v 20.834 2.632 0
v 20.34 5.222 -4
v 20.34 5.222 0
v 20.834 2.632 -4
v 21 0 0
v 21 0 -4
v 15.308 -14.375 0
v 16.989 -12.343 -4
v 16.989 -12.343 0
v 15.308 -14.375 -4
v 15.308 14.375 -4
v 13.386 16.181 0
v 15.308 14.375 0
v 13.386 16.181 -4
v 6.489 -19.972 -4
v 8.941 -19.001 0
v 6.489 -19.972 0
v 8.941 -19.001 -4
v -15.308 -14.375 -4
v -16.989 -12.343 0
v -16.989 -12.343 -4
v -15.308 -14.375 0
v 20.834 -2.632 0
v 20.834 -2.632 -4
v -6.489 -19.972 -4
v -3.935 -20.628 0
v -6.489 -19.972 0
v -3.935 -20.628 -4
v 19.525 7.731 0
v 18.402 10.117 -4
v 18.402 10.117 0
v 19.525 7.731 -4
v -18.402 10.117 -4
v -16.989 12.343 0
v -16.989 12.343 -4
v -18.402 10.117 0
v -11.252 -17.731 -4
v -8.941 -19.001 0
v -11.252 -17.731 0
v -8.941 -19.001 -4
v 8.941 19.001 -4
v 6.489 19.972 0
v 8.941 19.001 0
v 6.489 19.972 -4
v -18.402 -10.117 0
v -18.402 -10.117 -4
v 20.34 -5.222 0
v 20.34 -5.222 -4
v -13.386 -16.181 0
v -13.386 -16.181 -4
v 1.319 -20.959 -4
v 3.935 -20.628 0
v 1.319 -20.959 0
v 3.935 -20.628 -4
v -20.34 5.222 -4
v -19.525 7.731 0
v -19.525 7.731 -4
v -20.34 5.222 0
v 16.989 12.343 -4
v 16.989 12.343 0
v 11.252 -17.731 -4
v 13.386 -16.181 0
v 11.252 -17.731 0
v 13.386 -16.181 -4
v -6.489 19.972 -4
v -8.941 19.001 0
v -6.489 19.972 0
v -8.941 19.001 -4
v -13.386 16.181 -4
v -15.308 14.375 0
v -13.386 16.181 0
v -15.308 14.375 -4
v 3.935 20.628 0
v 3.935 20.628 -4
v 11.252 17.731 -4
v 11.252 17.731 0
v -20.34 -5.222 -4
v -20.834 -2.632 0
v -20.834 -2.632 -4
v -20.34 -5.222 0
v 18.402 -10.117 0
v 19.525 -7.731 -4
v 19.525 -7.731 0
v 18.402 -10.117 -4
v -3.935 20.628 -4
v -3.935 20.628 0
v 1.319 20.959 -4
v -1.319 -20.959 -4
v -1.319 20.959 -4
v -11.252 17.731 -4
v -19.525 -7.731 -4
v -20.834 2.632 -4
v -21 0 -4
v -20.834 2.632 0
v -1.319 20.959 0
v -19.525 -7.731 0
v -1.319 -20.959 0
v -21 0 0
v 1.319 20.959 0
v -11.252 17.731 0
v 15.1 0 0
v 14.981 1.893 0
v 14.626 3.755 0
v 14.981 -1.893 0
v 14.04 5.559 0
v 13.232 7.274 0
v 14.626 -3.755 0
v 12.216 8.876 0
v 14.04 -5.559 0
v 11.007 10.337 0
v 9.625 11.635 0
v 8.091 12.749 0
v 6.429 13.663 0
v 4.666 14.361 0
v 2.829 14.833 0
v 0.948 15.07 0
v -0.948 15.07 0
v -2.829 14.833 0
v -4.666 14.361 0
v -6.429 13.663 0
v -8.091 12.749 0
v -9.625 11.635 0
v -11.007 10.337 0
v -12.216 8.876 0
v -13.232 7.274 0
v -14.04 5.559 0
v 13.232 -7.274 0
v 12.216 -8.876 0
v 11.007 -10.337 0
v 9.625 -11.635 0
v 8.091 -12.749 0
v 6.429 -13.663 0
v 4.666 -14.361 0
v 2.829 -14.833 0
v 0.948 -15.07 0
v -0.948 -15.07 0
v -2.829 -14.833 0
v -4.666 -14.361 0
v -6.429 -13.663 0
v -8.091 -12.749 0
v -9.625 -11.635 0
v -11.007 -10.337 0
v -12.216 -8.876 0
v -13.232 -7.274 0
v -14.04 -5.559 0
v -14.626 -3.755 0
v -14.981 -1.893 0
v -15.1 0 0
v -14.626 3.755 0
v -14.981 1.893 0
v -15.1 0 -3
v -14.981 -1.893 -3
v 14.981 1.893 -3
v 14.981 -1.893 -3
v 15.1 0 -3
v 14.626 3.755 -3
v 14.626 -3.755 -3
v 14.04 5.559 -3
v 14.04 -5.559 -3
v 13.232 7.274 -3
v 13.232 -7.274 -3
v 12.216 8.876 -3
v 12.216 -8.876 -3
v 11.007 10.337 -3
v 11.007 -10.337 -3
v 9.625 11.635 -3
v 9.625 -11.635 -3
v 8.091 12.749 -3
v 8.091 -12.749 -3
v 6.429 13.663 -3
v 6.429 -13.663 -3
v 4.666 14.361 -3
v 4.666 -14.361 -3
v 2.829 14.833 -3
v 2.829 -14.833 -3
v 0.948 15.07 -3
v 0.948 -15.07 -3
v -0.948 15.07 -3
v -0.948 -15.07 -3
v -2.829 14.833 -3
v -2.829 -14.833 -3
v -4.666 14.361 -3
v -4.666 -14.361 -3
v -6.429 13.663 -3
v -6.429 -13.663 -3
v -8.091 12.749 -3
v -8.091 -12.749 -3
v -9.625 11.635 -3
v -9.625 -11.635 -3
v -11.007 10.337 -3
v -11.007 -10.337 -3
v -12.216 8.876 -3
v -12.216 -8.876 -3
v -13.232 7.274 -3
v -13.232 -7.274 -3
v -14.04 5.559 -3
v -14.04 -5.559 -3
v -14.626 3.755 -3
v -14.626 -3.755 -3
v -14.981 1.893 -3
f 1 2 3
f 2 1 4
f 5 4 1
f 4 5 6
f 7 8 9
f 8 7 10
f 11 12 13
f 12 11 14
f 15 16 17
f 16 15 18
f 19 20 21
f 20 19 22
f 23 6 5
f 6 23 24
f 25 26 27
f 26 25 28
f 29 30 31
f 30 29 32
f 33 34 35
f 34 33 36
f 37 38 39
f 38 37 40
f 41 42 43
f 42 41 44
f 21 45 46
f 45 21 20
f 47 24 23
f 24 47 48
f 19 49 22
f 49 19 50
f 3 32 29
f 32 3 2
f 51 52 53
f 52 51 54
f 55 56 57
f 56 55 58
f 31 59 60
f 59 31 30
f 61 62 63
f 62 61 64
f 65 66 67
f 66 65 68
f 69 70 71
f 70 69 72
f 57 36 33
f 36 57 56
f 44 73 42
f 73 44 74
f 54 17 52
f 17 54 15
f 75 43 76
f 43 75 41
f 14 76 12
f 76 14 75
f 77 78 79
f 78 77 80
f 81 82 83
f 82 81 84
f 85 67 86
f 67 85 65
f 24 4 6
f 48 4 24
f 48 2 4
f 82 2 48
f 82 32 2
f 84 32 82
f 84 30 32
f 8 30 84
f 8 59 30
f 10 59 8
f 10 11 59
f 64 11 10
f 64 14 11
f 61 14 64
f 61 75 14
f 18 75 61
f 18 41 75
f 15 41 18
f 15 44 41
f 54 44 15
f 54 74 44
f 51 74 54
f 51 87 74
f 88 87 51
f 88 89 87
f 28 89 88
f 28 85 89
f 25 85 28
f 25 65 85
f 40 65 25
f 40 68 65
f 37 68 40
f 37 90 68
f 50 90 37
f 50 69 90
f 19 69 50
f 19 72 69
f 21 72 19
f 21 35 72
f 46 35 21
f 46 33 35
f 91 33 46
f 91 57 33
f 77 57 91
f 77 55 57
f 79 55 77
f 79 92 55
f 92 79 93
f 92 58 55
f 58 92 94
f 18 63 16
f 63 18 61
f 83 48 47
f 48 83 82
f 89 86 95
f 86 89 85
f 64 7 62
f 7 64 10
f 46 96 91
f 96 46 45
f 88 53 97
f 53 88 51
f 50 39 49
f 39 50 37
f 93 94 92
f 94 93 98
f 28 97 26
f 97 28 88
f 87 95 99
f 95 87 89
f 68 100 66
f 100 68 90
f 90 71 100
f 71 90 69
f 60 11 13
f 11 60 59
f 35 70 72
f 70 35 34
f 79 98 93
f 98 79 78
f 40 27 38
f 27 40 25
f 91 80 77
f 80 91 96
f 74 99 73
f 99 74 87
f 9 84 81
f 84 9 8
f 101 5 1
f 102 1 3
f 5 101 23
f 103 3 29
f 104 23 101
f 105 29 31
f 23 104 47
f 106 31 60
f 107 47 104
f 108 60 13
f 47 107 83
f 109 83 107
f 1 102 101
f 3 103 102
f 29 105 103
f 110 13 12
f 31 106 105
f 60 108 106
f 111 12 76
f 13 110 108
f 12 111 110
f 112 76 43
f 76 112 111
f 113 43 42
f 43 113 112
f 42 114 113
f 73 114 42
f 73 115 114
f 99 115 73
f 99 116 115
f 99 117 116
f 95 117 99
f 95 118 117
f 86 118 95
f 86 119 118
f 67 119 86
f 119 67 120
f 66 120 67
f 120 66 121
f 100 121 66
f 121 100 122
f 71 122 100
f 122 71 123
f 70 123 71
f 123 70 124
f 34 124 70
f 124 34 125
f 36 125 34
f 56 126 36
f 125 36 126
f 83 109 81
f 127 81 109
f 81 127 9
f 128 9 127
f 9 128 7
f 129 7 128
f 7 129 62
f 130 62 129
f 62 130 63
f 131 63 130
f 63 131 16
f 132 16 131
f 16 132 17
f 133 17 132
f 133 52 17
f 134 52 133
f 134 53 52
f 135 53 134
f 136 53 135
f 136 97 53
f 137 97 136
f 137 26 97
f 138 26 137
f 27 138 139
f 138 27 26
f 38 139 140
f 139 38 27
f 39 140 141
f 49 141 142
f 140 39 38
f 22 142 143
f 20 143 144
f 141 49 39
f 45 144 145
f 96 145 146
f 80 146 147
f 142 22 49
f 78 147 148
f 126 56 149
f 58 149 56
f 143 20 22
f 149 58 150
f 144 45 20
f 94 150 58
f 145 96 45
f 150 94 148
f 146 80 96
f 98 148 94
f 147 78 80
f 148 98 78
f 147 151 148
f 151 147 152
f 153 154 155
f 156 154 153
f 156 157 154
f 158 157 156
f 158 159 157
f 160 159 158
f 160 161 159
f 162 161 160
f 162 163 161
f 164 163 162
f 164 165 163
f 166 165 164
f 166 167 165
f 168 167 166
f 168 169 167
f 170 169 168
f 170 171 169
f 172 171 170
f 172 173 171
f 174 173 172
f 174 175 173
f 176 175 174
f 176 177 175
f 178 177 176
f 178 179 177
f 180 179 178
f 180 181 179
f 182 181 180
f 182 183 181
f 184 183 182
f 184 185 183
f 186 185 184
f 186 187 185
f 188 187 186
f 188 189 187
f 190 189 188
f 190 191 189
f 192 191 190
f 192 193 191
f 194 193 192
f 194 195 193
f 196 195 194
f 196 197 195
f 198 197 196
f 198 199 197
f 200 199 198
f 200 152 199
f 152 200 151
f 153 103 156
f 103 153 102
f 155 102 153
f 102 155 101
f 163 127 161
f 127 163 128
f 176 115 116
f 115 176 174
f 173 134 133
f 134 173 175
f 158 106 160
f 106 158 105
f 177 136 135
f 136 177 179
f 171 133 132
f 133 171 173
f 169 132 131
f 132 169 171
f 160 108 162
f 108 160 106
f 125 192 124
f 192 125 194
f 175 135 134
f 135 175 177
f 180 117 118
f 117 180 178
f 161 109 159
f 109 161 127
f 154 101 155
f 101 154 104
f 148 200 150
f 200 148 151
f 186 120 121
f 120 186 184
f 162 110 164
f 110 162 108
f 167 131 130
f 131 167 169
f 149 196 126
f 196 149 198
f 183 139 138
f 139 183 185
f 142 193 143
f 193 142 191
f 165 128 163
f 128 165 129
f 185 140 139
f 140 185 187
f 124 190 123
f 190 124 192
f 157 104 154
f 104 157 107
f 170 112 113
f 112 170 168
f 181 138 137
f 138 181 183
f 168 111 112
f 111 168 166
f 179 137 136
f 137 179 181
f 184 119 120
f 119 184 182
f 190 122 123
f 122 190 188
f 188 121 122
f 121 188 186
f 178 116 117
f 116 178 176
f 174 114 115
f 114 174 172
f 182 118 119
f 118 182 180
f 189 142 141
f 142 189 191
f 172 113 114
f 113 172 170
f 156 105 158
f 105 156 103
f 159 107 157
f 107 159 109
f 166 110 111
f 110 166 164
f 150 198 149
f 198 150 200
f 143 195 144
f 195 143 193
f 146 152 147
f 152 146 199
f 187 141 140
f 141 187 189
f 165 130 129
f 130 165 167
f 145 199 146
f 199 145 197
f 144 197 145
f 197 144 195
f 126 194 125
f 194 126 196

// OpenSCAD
$fn = 50;


difference() {
	union() {
		translate(v = [0, 0, -4.0000000000]) {
			cylinder(h = 4, r = 21.0000000000);
		}
	}
	union() {
		#translate(v = [0, 0, -3.0000000000]) {
			cylinder(h = 3, r = 15.1000000000);
		}
	}
}
